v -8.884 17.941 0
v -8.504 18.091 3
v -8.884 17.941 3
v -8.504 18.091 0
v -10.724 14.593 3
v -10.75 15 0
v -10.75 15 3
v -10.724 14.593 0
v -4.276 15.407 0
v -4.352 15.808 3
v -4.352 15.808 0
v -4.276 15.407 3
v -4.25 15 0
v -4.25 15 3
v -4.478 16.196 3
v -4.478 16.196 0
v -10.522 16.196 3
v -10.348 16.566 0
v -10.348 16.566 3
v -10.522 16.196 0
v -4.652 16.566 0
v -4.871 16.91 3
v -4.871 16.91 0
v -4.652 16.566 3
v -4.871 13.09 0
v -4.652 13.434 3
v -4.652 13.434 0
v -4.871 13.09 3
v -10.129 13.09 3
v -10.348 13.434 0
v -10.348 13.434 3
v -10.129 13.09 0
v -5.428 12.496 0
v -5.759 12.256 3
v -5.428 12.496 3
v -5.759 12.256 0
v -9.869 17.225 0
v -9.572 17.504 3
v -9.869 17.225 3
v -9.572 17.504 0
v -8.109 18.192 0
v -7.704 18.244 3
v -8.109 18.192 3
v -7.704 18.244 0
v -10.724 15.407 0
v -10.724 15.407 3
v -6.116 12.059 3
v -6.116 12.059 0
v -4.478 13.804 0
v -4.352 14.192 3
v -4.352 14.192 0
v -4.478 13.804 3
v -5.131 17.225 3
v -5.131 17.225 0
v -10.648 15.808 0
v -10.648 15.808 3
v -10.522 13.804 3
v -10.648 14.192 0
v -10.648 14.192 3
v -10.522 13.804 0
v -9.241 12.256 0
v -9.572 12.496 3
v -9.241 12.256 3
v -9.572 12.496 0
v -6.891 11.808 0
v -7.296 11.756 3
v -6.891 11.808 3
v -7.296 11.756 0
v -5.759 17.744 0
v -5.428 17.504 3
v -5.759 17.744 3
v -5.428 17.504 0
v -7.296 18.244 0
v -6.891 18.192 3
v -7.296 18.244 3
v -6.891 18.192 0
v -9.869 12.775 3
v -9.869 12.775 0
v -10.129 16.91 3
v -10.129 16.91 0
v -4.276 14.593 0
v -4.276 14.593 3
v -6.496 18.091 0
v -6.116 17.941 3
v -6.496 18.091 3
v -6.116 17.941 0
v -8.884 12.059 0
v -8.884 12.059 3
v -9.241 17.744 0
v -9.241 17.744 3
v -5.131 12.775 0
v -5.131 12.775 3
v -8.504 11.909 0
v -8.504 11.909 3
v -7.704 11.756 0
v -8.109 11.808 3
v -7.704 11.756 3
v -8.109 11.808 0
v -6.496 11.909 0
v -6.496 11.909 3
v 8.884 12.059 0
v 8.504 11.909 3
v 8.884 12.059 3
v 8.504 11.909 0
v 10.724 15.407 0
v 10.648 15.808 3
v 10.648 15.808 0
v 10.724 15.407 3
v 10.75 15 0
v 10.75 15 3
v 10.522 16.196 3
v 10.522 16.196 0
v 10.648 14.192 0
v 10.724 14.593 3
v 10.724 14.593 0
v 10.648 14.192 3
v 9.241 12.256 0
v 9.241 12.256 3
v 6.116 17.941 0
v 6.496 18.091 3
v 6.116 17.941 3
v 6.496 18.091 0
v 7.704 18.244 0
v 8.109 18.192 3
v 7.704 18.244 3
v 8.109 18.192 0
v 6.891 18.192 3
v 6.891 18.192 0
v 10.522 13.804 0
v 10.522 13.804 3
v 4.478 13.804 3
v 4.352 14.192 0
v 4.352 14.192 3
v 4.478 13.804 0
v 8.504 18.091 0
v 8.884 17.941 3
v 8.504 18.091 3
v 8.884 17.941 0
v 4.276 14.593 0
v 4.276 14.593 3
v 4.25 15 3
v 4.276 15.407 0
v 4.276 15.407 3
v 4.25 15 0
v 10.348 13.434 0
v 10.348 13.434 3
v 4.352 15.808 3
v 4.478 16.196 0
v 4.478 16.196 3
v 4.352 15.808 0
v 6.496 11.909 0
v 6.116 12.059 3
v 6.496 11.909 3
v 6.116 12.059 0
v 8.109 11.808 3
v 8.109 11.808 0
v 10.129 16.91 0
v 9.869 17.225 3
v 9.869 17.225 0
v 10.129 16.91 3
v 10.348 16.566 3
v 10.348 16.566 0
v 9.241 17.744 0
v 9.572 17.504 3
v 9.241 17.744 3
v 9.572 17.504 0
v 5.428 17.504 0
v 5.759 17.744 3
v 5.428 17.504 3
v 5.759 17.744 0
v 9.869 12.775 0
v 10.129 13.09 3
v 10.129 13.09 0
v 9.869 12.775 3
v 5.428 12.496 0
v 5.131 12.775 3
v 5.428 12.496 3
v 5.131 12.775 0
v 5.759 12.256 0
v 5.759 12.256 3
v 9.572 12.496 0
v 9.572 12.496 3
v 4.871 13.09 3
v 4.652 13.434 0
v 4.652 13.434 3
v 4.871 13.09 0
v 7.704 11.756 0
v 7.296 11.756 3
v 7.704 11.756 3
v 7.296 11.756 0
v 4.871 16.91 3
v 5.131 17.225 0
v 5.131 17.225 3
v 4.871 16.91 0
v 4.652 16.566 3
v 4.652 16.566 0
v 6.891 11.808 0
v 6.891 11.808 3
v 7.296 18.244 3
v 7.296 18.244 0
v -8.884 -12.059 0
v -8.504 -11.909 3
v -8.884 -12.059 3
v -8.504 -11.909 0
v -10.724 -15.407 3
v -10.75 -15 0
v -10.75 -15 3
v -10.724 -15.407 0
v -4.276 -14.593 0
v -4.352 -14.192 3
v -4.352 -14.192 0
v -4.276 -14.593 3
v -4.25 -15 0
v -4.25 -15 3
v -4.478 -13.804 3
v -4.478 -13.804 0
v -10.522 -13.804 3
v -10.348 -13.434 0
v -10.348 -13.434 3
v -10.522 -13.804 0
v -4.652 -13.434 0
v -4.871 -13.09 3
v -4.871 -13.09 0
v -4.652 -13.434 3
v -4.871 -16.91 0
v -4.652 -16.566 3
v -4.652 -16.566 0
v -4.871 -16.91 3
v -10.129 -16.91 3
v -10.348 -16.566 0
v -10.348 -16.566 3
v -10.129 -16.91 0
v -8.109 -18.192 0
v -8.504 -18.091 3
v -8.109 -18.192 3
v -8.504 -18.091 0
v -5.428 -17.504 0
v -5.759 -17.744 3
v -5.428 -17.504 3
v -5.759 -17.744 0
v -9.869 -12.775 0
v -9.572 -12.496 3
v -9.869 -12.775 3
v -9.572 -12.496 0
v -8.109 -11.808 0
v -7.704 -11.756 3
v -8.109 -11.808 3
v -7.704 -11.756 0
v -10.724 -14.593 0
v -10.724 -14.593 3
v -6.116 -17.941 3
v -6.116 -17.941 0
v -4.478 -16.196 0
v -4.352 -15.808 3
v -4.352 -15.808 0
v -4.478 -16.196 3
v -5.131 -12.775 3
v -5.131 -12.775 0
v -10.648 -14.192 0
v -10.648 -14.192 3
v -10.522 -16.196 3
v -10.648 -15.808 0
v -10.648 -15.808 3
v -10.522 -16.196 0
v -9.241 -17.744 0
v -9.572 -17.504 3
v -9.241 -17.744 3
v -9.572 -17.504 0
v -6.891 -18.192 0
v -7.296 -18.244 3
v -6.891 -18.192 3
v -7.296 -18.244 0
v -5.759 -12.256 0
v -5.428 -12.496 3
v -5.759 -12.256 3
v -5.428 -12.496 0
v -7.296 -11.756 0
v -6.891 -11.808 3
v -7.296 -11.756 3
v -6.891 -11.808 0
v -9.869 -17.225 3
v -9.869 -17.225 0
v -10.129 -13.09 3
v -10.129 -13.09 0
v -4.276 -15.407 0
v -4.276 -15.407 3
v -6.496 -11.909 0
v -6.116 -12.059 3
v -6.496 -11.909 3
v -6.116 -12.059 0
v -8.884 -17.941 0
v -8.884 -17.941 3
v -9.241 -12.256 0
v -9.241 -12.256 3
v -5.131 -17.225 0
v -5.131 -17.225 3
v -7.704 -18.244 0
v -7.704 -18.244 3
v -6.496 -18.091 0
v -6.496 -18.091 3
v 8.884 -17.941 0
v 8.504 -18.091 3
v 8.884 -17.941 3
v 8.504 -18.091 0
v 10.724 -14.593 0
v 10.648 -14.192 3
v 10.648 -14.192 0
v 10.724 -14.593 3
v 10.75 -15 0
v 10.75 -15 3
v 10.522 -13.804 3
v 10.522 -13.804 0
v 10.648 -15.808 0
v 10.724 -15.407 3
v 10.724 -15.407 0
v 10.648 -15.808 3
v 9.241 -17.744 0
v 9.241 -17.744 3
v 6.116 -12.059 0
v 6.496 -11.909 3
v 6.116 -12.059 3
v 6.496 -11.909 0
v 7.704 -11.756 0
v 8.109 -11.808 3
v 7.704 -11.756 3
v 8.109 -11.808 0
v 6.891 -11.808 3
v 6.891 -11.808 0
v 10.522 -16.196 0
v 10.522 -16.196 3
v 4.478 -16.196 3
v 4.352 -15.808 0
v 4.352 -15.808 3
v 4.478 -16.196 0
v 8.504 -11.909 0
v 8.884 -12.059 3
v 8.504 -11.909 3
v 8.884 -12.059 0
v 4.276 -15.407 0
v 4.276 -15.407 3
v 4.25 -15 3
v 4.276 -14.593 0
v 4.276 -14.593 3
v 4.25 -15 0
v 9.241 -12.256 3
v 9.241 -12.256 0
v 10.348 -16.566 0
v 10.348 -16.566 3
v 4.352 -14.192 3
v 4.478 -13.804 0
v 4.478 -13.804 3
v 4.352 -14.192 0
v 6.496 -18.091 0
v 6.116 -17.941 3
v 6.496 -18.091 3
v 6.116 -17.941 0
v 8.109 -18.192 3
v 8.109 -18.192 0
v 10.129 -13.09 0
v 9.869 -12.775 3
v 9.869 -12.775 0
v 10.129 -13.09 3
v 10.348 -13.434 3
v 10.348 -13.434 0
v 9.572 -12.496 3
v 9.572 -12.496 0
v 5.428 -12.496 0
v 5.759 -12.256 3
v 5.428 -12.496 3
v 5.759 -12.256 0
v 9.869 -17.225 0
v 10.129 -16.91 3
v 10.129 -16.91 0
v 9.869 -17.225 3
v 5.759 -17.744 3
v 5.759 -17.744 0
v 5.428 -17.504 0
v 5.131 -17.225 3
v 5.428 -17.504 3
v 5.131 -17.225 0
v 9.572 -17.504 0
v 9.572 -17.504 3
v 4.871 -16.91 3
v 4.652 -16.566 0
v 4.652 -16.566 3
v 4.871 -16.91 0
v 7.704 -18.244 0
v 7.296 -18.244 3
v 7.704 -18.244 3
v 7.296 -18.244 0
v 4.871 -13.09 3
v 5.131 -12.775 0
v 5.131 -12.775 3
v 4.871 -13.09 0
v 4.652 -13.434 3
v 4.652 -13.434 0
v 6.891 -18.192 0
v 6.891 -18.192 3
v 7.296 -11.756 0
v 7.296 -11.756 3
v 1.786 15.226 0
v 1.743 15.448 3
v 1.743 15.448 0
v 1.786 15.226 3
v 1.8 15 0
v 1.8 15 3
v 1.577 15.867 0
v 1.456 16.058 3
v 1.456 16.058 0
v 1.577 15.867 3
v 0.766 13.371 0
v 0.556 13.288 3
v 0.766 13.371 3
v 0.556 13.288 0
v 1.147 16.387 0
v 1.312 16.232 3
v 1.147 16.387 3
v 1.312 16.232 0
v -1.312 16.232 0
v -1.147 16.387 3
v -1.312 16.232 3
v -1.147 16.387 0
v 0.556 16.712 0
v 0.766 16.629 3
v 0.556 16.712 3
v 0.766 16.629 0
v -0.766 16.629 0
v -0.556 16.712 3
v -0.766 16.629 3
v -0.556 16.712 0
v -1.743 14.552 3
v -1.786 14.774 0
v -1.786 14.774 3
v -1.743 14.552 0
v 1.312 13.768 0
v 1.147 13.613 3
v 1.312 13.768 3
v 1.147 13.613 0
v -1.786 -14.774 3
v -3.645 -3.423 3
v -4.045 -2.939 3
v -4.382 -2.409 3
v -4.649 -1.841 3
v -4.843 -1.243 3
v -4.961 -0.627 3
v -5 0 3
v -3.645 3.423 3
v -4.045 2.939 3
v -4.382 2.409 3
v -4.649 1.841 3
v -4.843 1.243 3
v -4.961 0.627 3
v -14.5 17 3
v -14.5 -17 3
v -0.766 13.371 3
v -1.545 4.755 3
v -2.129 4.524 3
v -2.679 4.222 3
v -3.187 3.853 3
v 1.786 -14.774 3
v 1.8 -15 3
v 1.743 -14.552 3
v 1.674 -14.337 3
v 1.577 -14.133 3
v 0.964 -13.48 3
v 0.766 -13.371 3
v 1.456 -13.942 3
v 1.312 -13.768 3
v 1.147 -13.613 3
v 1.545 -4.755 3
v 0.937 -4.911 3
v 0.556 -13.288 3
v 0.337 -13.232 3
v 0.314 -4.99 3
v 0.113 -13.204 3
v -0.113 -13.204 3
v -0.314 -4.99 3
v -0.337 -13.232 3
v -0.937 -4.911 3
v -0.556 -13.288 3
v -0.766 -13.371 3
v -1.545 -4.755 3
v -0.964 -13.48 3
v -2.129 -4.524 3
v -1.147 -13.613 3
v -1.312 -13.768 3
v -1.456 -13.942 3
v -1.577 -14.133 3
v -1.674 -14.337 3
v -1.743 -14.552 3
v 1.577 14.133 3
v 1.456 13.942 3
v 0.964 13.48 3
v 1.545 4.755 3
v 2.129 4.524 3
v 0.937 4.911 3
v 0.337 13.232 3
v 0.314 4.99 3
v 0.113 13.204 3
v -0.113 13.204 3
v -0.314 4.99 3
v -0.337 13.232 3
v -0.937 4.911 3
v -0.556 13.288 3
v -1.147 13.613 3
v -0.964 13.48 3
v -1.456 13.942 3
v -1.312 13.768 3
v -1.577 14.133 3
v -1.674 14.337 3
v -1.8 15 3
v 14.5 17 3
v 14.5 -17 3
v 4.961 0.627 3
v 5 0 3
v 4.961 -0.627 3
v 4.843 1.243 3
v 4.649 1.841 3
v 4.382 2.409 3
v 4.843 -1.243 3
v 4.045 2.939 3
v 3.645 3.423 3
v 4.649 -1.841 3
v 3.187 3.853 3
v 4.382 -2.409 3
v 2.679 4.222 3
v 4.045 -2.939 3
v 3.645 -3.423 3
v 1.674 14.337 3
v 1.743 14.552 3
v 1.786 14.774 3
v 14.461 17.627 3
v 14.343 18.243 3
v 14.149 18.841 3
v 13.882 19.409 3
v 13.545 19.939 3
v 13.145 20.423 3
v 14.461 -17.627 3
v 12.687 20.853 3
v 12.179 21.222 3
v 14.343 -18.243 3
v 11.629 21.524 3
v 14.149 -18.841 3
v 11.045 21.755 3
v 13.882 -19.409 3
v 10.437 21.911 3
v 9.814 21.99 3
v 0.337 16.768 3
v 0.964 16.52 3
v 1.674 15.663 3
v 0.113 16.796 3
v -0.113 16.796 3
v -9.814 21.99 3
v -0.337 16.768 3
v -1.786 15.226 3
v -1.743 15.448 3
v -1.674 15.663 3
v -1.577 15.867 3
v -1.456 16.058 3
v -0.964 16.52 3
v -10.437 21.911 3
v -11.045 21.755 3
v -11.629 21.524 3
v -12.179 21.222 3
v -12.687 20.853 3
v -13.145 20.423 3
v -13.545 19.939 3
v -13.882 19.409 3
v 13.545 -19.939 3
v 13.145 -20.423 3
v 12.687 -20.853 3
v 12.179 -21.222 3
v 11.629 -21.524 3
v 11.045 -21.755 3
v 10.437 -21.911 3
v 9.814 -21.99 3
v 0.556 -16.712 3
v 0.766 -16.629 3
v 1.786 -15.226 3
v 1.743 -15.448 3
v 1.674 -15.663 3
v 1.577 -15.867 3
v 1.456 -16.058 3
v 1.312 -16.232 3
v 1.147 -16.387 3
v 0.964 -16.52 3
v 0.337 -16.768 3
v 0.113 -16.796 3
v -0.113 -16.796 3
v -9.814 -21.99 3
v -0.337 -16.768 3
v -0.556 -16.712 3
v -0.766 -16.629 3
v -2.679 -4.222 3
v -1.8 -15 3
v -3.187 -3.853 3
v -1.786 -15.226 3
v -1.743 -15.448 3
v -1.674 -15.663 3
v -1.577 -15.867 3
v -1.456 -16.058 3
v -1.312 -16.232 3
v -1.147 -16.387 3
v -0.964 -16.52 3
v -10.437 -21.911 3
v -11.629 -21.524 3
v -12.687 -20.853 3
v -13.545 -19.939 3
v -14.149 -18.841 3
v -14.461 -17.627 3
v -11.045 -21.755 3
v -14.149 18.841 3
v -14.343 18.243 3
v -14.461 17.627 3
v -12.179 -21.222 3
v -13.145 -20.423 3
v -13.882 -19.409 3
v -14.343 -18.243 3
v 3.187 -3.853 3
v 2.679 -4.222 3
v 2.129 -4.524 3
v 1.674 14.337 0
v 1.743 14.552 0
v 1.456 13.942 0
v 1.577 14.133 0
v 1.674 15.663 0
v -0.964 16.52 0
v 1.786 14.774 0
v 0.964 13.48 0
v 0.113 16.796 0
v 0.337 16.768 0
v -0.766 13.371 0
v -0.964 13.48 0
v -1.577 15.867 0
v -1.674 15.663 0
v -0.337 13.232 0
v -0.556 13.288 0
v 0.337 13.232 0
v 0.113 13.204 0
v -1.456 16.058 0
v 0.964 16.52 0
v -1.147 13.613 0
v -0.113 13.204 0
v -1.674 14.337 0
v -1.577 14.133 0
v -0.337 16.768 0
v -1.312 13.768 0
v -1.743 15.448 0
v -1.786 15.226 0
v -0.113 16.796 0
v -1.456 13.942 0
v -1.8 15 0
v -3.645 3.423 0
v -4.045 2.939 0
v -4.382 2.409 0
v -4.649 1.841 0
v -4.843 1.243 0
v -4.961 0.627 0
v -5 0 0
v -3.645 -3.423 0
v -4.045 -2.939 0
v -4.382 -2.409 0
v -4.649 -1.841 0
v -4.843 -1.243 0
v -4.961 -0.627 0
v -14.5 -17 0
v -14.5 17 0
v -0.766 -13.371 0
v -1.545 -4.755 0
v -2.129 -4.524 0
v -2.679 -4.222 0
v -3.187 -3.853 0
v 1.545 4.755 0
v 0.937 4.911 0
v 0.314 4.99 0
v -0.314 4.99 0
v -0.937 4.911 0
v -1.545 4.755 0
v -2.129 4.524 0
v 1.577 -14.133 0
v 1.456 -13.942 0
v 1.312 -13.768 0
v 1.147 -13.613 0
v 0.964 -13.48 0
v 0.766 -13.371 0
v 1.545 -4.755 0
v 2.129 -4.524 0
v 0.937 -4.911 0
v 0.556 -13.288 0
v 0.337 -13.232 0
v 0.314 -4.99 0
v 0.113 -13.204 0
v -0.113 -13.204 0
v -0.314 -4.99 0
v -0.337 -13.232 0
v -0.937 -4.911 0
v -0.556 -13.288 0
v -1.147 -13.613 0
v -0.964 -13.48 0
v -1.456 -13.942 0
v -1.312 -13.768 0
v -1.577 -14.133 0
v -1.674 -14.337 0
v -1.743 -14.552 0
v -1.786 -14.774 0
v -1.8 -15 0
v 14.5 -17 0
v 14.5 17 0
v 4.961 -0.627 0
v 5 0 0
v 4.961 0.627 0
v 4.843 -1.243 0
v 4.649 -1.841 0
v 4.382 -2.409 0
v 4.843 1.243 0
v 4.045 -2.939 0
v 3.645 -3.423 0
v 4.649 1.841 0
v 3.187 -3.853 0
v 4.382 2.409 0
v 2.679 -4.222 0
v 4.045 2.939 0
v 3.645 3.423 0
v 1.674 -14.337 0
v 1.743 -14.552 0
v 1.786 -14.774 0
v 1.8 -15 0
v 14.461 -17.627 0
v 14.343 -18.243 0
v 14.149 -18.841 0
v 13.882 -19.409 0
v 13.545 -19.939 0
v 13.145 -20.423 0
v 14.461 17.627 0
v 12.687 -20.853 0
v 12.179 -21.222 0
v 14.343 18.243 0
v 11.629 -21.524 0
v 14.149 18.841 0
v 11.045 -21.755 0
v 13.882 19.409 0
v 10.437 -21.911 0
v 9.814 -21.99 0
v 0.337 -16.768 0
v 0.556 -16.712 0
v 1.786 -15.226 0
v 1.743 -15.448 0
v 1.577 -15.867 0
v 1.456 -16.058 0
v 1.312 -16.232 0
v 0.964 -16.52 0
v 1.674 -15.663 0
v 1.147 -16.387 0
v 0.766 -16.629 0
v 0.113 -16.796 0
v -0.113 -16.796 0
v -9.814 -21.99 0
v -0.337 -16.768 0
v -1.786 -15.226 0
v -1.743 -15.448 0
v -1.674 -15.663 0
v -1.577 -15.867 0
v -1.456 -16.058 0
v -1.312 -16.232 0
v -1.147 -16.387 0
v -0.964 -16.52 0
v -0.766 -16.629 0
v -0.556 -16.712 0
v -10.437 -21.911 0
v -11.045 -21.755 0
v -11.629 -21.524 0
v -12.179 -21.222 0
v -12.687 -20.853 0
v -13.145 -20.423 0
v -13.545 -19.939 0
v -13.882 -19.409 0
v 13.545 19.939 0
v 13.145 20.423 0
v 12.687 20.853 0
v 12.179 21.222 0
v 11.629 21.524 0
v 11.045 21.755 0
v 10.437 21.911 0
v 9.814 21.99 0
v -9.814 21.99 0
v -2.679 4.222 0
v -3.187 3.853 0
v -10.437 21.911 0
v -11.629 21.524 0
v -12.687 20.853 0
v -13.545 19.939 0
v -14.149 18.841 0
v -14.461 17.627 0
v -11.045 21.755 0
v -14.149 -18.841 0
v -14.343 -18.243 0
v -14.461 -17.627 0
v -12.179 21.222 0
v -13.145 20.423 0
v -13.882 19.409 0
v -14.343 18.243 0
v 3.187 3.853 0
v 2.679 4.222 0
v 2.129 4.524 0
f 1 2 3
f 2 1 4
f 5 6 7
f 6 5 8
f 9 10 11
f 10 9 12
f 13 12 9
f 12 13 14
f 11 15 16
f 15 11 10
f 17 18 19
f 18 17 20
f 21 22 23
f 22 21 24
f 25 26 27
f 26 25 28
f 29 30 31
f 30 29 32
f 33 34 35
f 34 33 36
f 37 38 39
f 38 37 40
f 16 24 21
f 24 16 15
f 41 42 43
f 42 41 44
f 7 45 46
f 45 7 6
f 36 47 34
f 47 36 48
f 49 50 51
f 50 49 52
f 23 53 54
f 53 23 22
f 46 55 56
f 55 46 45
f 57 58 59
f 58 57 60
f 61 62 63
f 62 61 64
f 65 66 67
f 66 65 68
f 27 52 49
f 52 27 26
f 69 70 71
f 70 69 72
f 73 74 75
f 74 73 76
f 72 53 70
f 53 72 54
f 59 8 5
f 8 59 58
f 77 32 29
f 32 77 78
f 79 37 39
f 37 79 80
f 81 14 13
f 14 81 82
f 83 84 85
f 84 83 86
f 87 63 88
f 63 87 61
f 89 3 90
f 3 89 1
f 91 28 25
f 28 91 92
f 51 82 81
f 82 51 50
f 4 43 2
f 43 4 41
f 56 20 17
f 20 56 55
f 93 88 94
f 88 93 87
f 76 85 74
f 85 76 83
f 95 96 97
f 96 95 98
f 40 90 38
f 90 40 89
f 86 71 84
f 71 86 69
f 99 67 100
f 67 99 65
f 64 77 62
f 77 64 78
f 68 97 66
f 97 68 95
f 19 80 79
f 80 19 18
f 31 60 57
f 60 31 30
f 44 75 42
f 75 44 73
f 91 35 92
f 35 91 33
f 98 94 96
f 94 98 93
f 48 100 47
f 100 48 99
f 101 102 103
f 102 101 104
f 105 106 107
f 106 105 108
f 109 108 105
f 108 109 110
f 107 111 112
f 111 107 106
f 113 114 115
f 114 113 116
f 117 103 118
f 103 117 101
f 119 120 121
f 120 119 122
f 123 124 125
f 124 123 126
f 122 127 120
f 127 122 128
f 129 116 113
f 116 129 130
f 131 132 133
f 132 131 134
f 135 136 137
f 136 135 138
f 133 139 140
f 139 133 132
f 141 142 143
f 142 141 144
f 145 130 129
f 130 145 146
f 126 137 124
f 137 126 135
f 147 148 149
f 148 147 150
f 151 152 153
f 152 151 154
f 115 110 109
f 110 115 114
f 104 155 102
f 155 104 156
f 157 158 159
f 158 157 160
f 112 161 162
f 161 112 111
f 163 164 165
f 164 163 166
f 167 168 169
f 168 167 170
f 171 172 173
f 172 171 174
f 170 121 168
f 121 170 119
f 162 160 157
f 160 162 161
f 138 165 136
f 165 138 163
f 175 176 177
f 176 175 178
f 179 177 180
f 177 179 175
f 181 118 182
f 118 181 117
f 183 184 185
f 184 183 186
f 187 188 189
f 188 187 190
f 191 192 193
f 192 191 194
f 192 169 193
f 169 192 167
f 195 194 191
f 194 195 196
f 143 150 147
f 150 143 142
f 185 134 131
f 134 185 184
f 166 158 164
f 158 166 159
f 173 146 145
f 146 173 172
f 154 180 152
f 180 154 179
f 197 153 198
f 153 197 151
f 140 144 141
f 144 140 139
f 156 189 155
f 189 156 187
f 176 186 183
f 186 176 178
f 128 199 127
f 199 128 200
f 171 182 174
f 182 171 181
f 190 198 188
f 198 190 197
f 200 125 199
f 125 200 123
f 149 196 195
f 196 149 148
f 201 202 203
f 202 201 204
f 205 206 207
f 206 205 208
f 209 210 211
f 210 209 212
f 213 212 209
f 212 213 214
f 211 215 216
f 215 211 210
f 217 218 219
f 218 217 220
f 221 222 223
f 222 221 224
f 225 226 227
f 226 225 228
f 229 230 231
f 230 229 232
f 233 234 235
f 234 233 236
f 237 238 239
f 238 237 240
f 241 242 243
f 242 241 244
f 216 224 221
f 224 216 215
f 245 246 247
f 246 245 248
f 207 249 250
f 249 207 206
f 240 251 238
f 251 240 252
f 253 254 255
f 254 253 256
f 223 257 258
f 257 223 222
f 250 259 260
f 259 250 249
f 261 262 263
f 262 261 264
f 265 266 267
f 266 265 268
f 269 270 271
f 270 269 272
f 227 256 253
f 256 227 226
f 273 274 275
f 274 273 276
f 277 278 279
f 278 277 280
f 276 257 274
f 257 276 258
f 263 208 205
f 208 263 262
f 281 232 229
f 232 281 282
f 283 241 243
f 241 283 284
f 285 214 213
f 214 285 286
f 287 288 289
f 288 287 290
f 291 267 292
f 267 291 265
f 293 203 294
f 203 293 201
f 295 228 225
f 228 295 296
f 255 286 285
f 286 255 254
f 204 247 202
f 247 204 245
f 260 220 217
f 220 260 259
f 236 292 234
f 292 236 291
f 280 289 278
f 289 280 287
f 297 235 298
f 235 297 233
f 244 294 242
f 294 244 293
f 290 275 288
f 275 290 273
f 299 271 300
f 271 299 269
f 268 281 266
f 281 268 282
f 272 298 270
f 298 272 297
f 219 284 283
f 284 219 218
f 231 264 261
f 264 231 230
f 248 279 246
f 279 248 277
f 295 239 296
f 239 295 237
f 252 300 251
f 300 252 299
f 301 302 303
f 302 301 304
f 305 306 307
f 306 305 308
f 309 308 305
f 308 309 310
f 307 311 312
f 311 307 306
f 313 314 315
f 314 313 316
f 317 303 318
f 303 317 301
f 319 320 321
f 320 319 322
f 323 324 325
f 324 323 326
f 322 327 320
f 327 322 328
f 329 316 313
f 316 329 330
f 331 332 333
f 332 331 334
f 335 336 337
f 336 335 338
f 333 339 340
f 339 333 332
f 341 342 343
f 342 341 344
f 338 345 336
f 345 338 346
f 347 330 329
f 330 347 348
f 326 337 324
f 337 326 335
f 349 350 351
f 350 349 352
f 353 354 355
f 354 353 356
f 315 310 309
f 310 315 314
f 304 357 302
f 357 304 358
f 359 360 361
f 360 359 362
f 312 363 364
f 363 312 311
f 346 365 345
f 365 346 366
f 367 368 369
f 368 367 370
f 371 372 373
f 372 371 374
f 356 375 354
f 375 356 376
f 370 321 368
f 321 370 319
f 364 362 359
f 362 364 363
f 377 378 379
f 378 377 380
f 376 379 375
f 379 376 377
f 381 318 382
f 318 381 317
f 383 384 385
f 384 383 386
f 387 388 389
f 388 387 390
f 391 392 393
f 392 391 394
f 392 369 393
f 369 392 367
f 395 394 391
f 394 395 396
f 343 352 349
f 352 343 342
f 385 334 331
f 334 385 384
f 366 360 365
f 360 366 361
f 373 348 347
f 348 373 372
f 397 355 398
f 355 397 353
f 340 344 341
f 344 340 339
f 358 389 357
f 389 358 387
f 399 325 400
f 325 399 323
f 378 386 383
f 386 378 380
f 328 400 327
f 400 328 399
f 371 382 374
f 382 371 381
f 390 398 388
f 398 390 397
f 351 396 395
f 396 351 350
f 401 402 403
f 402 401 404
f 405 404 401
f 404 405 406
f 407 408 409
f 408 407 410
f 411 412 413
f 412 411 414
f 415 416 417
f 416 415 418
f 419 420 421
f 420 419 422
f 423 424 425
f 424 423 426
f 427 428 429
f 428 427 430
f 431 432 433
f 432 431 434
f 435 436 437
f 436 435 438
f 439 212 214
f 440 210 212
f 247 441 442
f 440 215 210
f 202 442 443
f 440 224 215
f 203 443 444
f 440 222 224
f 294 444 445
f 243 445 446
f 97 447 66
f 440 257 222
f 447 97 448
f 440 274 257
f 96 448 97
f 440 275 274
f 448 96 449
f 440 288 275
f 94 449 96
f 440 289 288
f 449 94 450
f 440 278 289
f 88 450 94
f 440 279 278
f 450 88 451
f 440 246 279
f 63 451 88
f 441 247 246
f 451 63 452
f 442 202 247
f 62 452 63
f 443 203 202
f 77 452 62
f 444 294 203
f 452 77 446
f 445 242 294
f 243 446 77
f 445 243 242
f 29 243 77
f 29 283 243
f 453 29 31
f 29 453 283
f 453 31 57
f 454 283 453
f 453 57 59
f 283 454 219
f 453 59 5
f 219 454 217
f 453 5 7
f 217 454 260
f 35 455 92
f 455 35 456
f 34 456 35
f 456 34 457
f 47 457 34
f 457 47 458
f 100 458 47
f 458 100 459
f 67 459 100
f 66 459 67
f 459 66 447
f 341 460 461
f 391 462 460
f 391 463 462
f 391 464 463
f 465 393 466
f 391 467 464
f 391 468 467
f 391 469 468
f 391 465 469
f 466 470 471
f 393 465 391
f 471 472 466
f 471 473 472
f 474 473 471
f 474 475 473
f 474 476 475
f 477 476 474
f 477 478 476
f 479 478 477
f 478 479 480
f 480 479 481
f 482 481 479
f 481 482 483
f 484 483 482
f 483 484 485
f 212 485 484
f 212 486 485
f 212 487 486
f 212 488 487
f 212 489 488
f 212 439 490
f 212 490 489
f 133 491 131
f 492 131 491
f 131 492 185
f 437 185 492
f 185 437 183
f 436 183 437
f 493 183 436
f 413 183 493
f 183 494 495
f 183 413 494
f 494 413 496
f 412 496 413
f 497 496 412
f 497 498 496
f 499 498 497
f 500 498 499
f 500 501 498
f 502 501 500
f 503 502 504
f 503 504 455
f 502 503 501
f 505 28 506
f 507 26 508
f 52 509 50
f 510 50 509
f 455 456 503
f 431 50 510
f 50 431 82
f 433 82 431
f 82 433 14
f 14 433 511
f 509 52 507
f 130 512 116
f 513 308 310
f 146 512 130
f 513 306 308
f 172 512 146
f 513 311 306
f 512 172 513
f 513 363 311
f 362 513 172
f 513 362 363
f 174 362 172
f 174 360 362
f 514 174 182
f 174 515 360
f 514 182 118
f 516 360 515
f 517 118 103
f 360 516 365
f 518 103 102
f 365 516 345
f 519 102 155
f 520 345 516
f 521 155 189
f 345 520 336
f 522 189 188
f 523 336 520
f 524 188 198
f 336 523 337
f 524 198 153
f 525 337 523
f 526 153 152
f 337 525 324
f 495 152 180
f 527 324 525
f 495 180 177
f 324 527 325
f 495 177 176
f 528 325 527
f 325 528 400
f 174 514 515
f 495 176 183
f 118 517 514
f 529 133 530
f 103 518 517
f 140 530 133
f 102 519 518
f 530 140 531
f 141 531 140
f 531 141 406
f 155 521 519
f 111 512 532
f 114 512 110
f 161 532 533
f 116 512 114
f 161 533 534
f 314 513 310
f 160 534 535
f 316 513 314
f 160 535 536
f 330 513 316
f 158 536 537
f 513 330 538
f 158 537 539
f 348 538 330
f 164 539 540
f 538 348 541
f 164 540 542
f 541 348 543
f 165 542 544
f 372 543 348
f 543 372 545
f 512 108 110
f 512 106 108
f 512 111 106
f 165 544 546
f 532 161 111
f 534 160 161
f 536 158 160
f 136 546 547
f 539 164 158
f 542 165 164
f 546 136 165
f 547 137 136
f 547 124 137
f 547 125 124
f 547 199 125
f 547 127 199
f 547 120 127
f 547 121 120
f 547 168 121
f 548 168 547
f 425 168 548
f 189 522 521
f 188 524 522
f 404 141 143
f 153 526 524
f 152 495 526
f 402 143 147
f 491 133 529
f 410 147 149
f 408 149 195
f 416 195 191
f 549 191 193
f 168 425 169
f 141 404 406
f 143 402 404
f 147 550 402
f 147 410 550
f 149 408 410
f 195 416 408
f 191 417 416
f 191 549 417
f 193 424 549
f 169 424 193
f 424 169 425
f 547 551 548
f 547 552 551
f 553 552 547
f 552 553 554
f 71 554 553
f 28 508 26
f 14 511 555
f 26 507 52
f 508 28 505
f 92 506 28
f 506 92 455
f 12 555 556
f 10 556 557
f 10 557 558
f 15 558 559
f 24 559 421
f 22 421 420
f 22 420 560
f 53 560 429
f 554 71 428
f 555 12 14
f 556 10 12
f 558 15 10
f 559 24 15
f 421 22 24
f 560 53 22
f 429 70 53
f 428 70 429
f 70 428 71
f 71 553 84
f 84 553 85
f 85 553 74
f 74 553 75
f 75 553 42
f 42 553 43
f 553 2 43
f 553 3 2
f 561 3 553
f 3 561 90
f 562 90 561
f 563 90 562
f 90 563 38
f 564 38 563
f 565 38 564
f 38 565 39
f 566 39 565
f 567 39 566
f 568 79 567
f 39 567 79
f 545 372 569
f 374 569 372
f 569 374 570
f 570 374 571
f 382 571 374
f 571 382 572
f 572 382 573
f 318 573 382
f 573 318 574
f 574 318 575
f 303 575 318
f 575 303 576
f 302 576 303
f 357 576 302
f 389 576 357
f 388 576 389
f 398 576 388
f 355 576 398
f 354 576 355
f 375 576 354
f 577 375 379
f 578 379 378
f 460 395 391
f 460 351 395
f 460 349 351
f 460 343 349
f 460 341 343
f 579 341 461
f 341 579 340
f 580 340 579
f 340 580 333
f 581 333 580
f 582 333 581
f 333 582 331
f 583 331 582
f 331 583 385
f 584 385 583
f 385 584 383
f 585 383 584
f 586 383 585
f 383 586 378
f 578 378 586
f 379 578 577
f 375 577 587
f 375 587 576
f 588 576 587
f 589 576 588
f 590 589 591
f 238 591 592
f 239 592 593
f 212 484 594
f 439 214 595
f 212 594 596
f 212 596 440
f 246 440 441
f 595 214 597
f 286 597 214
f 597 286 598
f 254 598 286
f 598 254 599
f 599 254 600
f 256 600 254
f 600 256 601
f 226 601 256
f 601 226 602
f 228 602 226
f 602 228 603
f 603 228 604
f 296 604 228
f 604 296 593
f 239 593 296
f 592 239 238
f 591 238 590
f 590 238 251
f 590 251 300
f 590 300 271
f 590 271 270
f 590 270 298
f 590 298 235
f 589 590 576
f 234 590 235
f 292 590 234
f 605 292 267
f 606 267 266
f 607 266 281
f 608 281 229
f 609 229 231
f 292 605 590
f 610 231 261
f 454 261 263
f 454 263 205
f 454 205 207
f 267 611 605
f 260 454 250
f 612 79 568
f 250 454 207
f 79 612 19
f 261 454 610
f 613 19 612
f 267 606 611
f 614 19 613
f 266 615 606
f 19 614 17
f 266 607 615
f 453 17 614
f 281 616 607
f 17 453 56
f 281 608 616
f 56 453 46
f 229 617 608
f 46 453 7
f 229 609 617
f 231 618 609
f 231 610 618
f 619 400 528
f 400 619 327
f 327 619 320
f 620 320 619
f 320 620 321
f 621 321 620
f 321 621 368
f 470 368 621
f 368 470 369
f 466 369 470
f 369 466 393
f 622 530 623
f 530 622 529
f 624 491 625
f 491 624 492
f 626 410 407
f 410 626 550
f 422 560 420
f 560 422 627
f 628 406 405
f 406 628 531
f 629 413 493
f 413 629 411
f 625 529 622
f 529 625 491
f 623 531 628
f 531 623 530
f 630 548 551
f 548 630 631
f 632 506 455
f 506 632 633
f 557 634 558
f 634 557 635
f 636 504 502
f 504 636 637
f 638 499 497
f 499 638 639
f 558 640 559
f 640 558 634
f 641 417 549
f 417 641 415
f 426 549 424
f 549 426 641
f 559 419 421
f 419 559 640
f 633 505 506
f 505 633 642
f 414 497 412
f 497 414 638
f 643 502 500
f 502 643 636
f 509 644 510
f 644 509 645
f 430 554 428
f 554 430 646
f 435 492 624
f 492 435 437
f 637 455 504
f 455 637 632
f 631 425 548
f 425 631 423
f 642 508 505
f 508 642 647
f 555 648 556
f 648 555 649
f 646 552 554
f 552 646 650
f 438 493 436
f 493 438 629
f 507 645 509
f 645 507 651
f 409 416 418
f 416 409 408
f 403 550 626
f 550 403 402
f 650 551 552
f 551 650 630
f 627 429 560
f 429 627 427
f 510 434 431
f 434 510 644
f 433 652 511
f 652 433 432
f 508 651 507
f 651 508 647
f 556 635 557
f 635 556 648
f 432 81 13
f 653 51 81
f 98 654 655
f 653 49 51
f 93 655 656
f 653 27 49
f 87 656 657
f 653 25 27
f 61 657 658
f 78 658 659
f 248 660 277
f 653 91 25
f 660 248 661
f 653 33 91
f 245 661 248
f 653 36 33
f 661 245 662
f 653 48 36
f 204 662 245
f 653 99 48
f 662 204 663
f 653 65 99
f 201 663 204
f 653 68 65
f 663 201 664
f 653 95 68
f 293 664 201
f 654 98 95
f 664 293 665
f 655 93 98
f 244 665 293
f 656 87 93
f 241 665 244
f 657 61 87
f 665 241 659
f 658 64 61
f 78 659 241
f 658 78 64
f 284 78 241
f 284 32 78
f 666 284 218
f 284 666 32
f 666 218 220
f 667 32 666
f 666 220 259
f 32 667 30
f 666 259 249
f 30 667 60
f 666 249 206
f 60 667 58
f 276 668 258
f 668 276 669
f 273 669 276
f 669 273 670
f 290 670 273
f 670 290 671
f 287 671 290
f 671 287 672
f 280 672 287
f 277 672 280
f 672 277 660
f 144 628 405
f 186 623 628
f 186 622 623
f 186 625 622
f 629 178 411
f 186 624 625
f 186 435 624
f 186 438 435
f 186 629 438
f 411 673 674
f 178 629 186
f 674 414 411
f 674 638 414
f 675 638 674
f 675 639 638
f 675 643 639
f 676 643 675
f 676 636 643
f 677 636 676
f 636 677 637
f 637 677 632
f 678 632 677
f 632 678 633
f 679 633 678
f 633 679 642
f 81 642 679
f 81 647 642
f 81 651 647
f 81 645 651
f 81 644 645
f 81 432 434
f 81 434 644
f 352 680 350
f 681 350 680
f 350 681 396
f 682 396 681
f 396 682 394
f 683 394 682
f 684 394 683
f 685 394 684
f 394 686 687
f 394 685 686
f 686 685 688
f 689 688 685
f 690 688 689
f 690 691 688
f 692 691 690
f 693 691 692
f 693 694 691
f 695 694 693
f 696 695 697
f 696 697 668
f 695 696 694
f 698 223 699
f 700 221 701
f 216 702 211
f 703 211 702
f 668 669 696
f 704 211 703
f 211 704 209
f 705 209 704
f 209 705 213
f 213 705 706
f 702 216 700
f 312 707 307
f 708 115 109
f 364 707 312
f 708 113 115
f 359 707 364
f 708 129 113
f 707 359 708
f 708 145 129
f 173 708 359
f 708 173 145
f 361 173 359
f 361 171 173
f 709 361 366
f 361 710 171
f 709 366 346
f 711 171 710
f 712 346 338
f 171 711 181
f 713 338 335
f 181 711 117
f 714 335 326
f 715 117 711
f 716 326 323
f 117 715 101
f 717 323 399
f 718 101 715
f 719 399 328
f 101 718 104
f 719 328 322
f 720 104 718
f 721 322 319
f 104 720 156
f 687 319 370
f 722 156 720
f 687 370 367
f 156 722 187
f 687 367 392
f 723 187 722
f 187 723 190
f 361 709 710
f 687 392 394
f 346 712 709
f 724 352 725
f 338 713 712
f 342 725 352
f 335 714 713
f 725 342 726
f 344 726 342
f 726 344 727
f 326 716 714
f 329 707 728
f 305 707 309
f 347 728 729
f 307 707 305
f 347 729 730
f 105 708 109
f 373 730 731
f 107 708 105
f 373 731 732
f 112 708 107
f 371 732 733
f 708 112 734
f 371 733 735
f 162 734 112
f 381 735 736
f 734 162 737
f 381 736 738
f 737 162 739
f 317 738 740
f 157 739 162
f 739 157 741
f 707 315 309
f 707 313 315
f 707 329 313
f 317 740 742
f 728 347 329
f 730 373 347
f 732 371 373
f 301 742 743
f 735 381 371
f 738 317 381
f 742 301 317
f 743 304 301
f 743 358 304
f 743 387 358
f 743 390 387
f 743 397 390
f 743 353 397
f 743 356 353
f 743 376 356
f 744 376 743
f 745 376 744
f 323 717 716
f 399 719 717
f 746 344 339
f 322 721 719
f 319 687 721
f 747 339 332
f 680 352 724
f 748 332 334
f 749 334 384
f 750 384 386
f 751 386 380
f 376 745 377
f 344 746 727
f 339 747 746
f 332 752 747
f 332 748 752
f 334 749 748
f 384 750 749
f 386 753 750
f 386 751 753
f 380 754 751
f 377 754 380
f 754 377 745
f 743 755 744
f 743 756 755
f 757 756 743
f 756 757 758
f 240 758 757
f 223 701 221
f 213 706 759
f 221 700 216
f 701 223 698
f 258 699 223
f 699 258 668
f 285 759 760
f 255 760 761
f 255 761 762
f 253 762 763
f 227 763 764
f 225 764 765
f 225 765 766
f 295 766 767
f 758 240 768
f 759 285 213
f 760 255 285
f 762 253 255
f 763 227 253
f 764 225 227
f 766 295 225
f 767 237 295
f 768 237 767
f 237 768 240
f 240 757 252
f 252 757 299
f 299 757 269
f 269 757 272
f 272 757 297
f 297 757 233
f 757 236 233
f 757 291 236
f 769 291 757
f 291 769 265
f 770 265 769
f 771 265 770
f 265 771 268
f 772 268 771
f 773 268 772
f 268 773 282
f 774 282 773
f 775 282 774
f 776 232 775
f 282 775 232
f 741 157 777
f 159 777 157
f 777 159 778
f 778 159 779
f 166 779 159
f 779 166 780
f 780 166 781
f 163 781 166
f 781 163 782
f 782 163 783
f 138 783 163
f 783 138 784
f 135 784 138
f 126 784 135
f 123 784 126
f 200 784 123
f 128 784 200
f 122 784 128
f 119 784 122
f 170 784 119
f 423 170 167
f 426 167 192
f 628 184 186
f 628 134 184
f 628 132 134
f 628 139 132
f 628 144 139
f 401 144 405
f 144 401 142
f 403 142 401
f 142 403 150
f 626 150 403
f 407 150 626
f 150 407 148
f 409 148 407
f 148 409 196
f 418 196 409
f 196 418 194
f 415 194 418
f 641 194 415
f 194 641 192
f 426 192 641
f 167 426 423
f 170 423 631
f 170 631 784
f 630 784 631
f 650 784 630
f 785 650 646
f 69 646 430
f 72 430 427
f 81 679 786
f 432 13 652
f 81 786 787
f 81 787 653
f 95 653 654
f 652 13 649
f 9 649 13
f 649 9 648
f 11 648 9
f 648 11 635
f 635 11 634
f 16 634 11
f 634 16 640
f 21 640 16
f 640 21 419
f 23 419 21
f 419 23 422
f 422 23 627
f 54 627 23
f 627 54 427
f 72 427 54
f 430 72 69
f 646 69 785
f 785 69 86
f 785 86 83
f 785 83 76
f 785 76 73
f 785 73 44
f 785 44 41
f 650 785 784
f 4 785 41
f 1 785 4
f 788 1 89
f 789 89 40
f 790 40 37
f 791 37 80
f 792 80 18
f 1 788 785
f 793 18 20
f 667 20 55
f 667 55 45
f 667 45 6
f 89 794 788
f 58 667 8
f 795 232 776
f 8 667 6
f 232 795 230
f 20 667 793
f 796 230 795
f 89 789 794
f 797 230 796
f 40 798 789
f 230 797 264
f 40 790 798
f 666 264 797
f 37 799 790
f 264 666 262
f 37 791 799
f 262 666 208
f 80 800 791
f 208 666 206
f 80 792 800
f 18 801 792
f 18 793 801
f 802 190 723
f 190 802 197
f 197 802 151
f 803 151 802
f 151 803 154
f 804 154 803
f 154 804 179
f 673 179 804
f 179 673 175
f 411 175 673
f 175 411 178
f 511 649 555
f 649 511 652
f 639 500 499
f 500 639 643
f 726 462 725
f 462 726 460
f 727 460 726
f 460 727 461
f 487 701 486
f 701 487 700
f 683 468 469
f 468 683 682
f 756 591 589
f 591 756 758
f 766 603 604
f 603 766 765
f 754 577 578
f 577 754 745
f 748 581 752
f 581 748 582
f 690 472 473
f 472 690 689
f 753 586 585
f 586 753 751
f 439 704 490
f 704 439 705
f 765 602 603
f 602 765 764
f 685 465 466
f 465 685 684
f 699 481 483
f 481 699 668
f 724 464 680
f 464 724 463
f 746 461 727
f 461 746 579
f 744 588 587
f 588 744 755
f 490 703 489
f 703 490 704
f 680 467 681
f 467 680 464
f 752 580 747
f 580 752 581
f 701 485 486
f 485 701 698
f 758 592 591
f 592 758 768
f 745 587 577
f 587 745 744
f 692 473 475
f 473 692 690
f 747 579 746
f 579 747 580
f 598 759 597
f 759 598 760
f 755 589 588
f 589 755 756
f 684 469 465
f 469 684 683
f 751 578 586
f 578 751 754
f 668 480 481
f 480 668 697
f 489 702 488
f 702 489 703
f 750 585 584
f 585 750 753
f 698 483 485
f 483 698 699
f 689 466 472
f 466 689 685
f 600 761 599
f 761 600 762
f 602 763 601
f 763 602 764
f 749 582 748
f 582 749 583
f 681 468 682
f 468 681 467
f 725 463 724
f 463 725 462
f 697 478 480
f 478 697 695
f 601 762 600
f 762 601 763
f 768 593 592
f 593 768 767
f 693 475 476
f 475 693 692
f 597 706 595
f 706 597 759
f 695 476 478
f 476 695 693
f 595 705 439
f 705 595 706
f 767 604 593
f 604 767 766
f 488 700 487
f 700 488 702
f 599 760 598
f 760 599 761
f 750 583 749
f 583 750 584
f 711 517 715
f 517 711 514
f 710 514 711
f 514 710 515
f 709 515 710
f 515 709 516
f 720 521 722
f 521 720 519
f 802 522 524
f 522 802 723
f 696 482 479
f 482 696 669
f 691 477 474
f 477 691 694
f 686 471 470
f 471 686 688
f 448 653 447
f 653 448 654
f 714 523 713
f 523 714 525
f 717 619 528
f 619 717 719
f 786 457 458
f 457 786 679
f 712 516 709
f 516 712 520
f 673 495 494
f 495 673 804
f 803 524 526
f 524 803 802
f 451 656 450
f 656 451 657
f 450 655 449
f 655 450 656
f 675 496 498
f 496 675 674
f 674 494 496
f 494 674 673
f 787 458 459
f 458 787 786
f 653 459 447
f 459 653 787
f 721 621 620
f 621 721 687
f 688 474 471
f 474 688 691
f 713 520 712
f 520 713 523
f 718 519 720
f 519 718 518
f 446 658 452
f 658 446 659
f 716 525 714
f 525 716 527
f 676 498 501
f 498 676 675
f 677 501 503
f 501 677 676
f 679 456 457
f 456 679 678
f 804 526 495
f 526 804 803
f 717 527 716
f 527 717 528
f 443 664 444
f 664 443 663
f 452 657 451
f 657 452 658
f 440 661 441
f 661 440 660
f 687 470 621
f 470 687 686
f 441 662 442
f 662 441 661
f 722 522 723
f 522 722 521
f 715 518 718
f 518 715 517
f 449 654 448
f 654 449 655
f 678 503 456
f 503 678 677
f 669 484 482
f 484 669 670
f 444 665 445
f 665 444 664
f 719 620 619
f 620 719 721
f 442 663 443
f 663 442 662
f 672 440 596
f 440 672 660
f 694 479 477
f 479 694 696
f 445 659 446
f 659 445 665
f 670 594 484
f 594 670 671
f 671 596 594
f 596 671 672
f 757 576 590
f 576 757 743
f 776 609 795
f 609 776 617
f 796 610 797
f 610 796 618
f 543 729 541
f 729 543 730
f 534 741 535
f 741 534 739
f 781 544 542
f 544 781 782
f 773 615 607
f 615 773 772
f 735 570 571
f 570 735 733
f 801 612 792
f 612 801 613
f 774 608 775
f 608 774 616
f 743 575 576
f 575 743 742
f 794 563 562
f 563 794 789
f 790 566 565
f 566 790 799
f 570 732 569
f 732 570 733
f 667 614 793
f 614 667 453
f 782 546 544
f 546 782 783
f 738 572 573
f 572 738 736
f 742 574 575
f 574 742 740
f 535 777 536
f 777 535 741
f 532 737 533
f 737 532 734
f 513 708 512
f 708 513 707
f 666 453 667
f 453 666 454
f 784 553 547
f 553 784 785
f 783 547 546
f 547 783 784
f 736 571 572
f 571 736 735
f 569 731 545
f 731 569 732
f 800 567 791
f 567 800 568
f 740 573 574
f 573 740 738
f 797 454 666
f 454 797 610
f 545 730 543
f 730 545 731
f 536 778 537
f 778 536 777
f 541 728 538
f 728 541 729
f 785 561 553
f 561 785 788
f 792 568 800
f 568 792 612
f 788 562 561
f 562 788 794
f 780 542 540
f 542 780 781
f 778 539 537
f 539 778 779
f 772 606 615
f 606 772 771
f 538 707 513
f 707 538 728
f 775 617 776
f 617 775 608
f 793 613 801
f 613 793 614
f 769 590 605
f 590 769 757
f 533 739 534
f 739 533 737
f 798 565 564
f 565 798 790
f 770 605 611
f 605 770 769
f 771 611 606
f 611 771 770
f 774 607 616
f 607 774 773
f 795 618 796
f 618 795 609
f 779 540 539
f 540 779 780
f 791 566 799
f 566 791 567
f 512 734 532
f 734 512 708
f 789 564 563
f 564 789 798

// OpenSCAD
$fn = 50;


difference() {
	union() {
		hull() {
			translate(v = [-9.5000000000, 17.0000000000, 0]) {
				cylinder(h = 3, r = 5);
			}
			translate(v = [9.5000000000, 17.0000000000, 0]) {
				cylinder(h = 3, r = 5);
			}
			translate(v = [-9.5000000000, -17.0000000000, 0]) {
				cylinder(h = 3, r = 5);
			}
			translate(v = [9.5000000000, -17.0000000000, 0]) {
				cylinder(h = 3, r = 5);
			}
		}
	}
	union() {
		#translate(v = [-7.5000000000, 15.0000000000, 0]) {
			cylinder(h = 3, r = 3.2500000000);
		}
		#translate(v = [7.5000000000, 15.0000000000, 0]) {
			cylinder(h = 3, r = 3.2500000000);
		}
		#translate(v = [-7.5000000000, -15.0000000000, 0]) {
			cylinder(h = 3, r = 3.2500000000);
		}
		#translate(v = [7.5000000000, -15.0000000000, 0]) {
			cylinder(h = 3, r = 3.2500000000);
		}
		#translate(v = [-7.5000000000, -15.0000000000, -100.0000000000]) {
			cylinder(h = 200, r = 3.2500000000);
		}
		#translate(v = [-7.5000000000, 15.0000000000, -100.0000000000]) {
			cylinder(h = 200, r = 3.2500000000);
		}
		#translate(v = [7.5000000000, -15.0000000000, -100.0000000000]) {
			cylinder(h = 200, r = 3.2500000000);
		}
		#translate(v = [7.5000000000, 15.0000000000, -100.0000000000]) {
			cylinder(h = 200, r = 3.2500000000);
		}
		#translate(v = [-7.5000000000, 15.0000000000, 0]) {
			cylinder(h = 3, r = 1.8000000000);
		}
		#translate(v = [0.0000000000, 15.0000000000, 0]) {
			cylinder(h = 3, r = 1.8000000000);
		}
		#translate(v = [7.5000000000, 15.0000000000, 0]) {
			cylinder(h = 3, r = 1.8000000000);
		}
		#translate(v = [-7.5000000000, -15.0000000000, 0]) {
			cylinder(h = 3, r = 1.8000000000);
		}
		#translate(v = [0.0000000000, -15.0000000000, 0]) {
			cylinder(h = 3, r = 1.8000000000);
		}
		#translate(v = [7.5000000000, -15.0000000000, 0]) {
			cylinder(h = 3, r = 1.8000000000);
		}
		#translate(v = [-7.5000000000, 15.0000000000, 0]) {
			cylinder(h = 3, r = 1.8000000000);
		}
		#translate(v = [0.0000000000, 15.0000000000, 0]) {
			cylinder(h = 3, r = 1.8000000000);
		}
		#translate(v = [7.5000000000, 15.0000000000, 0]) {
			cylinder(h = 3, r = 1.8000000000);
		}
		#translate(v = [-7.5000000000, -15.0000000000, 0]) {
			cylinder(h = 3, r = 1.8000000000);
		}
		#translate(v = [0.0000000000, -15.0000000000, 0]) {
			cylinder(h = 3, r = 1.8000000000);
		}
		#translate(v = [7.5000000000, -15.0000000000, 0]) {
			cylinder(h = 3, r = 1.8000000000);
		}
		#translate(v = [-7.5000000000, 15.0000000000, 0]) {
			cylinder(h = 3, r = 1.8000000000);
		}
		#translate(v = [0.0000000000, 15.0000000000, 0]) {
			cylinder(h = 3, r = 1.8000000000);
		}
		#translate(v = [7.5000000000, 15.0000000000, 0]) {
			cylinder(h = 3, r = 1.8000000000);
		}
		#translate(v = [-7.5000000000, -15.0000000000, 0]) {
			cylinder(h = 3, r = 1.8000000000);
		}
		#translate(v = [0.0000000000, -15.0000000000, 0]) {
			cylinder(h = 3, r = 1.8000000000);
		}
		#translate(v = [7.5000000000, -15.0000000000, 0]) {
			cylinder(h = 3, r = 1.8000000000);
		}
		#cylinder(h = 3, r = 5.0000000000);
	}
}
